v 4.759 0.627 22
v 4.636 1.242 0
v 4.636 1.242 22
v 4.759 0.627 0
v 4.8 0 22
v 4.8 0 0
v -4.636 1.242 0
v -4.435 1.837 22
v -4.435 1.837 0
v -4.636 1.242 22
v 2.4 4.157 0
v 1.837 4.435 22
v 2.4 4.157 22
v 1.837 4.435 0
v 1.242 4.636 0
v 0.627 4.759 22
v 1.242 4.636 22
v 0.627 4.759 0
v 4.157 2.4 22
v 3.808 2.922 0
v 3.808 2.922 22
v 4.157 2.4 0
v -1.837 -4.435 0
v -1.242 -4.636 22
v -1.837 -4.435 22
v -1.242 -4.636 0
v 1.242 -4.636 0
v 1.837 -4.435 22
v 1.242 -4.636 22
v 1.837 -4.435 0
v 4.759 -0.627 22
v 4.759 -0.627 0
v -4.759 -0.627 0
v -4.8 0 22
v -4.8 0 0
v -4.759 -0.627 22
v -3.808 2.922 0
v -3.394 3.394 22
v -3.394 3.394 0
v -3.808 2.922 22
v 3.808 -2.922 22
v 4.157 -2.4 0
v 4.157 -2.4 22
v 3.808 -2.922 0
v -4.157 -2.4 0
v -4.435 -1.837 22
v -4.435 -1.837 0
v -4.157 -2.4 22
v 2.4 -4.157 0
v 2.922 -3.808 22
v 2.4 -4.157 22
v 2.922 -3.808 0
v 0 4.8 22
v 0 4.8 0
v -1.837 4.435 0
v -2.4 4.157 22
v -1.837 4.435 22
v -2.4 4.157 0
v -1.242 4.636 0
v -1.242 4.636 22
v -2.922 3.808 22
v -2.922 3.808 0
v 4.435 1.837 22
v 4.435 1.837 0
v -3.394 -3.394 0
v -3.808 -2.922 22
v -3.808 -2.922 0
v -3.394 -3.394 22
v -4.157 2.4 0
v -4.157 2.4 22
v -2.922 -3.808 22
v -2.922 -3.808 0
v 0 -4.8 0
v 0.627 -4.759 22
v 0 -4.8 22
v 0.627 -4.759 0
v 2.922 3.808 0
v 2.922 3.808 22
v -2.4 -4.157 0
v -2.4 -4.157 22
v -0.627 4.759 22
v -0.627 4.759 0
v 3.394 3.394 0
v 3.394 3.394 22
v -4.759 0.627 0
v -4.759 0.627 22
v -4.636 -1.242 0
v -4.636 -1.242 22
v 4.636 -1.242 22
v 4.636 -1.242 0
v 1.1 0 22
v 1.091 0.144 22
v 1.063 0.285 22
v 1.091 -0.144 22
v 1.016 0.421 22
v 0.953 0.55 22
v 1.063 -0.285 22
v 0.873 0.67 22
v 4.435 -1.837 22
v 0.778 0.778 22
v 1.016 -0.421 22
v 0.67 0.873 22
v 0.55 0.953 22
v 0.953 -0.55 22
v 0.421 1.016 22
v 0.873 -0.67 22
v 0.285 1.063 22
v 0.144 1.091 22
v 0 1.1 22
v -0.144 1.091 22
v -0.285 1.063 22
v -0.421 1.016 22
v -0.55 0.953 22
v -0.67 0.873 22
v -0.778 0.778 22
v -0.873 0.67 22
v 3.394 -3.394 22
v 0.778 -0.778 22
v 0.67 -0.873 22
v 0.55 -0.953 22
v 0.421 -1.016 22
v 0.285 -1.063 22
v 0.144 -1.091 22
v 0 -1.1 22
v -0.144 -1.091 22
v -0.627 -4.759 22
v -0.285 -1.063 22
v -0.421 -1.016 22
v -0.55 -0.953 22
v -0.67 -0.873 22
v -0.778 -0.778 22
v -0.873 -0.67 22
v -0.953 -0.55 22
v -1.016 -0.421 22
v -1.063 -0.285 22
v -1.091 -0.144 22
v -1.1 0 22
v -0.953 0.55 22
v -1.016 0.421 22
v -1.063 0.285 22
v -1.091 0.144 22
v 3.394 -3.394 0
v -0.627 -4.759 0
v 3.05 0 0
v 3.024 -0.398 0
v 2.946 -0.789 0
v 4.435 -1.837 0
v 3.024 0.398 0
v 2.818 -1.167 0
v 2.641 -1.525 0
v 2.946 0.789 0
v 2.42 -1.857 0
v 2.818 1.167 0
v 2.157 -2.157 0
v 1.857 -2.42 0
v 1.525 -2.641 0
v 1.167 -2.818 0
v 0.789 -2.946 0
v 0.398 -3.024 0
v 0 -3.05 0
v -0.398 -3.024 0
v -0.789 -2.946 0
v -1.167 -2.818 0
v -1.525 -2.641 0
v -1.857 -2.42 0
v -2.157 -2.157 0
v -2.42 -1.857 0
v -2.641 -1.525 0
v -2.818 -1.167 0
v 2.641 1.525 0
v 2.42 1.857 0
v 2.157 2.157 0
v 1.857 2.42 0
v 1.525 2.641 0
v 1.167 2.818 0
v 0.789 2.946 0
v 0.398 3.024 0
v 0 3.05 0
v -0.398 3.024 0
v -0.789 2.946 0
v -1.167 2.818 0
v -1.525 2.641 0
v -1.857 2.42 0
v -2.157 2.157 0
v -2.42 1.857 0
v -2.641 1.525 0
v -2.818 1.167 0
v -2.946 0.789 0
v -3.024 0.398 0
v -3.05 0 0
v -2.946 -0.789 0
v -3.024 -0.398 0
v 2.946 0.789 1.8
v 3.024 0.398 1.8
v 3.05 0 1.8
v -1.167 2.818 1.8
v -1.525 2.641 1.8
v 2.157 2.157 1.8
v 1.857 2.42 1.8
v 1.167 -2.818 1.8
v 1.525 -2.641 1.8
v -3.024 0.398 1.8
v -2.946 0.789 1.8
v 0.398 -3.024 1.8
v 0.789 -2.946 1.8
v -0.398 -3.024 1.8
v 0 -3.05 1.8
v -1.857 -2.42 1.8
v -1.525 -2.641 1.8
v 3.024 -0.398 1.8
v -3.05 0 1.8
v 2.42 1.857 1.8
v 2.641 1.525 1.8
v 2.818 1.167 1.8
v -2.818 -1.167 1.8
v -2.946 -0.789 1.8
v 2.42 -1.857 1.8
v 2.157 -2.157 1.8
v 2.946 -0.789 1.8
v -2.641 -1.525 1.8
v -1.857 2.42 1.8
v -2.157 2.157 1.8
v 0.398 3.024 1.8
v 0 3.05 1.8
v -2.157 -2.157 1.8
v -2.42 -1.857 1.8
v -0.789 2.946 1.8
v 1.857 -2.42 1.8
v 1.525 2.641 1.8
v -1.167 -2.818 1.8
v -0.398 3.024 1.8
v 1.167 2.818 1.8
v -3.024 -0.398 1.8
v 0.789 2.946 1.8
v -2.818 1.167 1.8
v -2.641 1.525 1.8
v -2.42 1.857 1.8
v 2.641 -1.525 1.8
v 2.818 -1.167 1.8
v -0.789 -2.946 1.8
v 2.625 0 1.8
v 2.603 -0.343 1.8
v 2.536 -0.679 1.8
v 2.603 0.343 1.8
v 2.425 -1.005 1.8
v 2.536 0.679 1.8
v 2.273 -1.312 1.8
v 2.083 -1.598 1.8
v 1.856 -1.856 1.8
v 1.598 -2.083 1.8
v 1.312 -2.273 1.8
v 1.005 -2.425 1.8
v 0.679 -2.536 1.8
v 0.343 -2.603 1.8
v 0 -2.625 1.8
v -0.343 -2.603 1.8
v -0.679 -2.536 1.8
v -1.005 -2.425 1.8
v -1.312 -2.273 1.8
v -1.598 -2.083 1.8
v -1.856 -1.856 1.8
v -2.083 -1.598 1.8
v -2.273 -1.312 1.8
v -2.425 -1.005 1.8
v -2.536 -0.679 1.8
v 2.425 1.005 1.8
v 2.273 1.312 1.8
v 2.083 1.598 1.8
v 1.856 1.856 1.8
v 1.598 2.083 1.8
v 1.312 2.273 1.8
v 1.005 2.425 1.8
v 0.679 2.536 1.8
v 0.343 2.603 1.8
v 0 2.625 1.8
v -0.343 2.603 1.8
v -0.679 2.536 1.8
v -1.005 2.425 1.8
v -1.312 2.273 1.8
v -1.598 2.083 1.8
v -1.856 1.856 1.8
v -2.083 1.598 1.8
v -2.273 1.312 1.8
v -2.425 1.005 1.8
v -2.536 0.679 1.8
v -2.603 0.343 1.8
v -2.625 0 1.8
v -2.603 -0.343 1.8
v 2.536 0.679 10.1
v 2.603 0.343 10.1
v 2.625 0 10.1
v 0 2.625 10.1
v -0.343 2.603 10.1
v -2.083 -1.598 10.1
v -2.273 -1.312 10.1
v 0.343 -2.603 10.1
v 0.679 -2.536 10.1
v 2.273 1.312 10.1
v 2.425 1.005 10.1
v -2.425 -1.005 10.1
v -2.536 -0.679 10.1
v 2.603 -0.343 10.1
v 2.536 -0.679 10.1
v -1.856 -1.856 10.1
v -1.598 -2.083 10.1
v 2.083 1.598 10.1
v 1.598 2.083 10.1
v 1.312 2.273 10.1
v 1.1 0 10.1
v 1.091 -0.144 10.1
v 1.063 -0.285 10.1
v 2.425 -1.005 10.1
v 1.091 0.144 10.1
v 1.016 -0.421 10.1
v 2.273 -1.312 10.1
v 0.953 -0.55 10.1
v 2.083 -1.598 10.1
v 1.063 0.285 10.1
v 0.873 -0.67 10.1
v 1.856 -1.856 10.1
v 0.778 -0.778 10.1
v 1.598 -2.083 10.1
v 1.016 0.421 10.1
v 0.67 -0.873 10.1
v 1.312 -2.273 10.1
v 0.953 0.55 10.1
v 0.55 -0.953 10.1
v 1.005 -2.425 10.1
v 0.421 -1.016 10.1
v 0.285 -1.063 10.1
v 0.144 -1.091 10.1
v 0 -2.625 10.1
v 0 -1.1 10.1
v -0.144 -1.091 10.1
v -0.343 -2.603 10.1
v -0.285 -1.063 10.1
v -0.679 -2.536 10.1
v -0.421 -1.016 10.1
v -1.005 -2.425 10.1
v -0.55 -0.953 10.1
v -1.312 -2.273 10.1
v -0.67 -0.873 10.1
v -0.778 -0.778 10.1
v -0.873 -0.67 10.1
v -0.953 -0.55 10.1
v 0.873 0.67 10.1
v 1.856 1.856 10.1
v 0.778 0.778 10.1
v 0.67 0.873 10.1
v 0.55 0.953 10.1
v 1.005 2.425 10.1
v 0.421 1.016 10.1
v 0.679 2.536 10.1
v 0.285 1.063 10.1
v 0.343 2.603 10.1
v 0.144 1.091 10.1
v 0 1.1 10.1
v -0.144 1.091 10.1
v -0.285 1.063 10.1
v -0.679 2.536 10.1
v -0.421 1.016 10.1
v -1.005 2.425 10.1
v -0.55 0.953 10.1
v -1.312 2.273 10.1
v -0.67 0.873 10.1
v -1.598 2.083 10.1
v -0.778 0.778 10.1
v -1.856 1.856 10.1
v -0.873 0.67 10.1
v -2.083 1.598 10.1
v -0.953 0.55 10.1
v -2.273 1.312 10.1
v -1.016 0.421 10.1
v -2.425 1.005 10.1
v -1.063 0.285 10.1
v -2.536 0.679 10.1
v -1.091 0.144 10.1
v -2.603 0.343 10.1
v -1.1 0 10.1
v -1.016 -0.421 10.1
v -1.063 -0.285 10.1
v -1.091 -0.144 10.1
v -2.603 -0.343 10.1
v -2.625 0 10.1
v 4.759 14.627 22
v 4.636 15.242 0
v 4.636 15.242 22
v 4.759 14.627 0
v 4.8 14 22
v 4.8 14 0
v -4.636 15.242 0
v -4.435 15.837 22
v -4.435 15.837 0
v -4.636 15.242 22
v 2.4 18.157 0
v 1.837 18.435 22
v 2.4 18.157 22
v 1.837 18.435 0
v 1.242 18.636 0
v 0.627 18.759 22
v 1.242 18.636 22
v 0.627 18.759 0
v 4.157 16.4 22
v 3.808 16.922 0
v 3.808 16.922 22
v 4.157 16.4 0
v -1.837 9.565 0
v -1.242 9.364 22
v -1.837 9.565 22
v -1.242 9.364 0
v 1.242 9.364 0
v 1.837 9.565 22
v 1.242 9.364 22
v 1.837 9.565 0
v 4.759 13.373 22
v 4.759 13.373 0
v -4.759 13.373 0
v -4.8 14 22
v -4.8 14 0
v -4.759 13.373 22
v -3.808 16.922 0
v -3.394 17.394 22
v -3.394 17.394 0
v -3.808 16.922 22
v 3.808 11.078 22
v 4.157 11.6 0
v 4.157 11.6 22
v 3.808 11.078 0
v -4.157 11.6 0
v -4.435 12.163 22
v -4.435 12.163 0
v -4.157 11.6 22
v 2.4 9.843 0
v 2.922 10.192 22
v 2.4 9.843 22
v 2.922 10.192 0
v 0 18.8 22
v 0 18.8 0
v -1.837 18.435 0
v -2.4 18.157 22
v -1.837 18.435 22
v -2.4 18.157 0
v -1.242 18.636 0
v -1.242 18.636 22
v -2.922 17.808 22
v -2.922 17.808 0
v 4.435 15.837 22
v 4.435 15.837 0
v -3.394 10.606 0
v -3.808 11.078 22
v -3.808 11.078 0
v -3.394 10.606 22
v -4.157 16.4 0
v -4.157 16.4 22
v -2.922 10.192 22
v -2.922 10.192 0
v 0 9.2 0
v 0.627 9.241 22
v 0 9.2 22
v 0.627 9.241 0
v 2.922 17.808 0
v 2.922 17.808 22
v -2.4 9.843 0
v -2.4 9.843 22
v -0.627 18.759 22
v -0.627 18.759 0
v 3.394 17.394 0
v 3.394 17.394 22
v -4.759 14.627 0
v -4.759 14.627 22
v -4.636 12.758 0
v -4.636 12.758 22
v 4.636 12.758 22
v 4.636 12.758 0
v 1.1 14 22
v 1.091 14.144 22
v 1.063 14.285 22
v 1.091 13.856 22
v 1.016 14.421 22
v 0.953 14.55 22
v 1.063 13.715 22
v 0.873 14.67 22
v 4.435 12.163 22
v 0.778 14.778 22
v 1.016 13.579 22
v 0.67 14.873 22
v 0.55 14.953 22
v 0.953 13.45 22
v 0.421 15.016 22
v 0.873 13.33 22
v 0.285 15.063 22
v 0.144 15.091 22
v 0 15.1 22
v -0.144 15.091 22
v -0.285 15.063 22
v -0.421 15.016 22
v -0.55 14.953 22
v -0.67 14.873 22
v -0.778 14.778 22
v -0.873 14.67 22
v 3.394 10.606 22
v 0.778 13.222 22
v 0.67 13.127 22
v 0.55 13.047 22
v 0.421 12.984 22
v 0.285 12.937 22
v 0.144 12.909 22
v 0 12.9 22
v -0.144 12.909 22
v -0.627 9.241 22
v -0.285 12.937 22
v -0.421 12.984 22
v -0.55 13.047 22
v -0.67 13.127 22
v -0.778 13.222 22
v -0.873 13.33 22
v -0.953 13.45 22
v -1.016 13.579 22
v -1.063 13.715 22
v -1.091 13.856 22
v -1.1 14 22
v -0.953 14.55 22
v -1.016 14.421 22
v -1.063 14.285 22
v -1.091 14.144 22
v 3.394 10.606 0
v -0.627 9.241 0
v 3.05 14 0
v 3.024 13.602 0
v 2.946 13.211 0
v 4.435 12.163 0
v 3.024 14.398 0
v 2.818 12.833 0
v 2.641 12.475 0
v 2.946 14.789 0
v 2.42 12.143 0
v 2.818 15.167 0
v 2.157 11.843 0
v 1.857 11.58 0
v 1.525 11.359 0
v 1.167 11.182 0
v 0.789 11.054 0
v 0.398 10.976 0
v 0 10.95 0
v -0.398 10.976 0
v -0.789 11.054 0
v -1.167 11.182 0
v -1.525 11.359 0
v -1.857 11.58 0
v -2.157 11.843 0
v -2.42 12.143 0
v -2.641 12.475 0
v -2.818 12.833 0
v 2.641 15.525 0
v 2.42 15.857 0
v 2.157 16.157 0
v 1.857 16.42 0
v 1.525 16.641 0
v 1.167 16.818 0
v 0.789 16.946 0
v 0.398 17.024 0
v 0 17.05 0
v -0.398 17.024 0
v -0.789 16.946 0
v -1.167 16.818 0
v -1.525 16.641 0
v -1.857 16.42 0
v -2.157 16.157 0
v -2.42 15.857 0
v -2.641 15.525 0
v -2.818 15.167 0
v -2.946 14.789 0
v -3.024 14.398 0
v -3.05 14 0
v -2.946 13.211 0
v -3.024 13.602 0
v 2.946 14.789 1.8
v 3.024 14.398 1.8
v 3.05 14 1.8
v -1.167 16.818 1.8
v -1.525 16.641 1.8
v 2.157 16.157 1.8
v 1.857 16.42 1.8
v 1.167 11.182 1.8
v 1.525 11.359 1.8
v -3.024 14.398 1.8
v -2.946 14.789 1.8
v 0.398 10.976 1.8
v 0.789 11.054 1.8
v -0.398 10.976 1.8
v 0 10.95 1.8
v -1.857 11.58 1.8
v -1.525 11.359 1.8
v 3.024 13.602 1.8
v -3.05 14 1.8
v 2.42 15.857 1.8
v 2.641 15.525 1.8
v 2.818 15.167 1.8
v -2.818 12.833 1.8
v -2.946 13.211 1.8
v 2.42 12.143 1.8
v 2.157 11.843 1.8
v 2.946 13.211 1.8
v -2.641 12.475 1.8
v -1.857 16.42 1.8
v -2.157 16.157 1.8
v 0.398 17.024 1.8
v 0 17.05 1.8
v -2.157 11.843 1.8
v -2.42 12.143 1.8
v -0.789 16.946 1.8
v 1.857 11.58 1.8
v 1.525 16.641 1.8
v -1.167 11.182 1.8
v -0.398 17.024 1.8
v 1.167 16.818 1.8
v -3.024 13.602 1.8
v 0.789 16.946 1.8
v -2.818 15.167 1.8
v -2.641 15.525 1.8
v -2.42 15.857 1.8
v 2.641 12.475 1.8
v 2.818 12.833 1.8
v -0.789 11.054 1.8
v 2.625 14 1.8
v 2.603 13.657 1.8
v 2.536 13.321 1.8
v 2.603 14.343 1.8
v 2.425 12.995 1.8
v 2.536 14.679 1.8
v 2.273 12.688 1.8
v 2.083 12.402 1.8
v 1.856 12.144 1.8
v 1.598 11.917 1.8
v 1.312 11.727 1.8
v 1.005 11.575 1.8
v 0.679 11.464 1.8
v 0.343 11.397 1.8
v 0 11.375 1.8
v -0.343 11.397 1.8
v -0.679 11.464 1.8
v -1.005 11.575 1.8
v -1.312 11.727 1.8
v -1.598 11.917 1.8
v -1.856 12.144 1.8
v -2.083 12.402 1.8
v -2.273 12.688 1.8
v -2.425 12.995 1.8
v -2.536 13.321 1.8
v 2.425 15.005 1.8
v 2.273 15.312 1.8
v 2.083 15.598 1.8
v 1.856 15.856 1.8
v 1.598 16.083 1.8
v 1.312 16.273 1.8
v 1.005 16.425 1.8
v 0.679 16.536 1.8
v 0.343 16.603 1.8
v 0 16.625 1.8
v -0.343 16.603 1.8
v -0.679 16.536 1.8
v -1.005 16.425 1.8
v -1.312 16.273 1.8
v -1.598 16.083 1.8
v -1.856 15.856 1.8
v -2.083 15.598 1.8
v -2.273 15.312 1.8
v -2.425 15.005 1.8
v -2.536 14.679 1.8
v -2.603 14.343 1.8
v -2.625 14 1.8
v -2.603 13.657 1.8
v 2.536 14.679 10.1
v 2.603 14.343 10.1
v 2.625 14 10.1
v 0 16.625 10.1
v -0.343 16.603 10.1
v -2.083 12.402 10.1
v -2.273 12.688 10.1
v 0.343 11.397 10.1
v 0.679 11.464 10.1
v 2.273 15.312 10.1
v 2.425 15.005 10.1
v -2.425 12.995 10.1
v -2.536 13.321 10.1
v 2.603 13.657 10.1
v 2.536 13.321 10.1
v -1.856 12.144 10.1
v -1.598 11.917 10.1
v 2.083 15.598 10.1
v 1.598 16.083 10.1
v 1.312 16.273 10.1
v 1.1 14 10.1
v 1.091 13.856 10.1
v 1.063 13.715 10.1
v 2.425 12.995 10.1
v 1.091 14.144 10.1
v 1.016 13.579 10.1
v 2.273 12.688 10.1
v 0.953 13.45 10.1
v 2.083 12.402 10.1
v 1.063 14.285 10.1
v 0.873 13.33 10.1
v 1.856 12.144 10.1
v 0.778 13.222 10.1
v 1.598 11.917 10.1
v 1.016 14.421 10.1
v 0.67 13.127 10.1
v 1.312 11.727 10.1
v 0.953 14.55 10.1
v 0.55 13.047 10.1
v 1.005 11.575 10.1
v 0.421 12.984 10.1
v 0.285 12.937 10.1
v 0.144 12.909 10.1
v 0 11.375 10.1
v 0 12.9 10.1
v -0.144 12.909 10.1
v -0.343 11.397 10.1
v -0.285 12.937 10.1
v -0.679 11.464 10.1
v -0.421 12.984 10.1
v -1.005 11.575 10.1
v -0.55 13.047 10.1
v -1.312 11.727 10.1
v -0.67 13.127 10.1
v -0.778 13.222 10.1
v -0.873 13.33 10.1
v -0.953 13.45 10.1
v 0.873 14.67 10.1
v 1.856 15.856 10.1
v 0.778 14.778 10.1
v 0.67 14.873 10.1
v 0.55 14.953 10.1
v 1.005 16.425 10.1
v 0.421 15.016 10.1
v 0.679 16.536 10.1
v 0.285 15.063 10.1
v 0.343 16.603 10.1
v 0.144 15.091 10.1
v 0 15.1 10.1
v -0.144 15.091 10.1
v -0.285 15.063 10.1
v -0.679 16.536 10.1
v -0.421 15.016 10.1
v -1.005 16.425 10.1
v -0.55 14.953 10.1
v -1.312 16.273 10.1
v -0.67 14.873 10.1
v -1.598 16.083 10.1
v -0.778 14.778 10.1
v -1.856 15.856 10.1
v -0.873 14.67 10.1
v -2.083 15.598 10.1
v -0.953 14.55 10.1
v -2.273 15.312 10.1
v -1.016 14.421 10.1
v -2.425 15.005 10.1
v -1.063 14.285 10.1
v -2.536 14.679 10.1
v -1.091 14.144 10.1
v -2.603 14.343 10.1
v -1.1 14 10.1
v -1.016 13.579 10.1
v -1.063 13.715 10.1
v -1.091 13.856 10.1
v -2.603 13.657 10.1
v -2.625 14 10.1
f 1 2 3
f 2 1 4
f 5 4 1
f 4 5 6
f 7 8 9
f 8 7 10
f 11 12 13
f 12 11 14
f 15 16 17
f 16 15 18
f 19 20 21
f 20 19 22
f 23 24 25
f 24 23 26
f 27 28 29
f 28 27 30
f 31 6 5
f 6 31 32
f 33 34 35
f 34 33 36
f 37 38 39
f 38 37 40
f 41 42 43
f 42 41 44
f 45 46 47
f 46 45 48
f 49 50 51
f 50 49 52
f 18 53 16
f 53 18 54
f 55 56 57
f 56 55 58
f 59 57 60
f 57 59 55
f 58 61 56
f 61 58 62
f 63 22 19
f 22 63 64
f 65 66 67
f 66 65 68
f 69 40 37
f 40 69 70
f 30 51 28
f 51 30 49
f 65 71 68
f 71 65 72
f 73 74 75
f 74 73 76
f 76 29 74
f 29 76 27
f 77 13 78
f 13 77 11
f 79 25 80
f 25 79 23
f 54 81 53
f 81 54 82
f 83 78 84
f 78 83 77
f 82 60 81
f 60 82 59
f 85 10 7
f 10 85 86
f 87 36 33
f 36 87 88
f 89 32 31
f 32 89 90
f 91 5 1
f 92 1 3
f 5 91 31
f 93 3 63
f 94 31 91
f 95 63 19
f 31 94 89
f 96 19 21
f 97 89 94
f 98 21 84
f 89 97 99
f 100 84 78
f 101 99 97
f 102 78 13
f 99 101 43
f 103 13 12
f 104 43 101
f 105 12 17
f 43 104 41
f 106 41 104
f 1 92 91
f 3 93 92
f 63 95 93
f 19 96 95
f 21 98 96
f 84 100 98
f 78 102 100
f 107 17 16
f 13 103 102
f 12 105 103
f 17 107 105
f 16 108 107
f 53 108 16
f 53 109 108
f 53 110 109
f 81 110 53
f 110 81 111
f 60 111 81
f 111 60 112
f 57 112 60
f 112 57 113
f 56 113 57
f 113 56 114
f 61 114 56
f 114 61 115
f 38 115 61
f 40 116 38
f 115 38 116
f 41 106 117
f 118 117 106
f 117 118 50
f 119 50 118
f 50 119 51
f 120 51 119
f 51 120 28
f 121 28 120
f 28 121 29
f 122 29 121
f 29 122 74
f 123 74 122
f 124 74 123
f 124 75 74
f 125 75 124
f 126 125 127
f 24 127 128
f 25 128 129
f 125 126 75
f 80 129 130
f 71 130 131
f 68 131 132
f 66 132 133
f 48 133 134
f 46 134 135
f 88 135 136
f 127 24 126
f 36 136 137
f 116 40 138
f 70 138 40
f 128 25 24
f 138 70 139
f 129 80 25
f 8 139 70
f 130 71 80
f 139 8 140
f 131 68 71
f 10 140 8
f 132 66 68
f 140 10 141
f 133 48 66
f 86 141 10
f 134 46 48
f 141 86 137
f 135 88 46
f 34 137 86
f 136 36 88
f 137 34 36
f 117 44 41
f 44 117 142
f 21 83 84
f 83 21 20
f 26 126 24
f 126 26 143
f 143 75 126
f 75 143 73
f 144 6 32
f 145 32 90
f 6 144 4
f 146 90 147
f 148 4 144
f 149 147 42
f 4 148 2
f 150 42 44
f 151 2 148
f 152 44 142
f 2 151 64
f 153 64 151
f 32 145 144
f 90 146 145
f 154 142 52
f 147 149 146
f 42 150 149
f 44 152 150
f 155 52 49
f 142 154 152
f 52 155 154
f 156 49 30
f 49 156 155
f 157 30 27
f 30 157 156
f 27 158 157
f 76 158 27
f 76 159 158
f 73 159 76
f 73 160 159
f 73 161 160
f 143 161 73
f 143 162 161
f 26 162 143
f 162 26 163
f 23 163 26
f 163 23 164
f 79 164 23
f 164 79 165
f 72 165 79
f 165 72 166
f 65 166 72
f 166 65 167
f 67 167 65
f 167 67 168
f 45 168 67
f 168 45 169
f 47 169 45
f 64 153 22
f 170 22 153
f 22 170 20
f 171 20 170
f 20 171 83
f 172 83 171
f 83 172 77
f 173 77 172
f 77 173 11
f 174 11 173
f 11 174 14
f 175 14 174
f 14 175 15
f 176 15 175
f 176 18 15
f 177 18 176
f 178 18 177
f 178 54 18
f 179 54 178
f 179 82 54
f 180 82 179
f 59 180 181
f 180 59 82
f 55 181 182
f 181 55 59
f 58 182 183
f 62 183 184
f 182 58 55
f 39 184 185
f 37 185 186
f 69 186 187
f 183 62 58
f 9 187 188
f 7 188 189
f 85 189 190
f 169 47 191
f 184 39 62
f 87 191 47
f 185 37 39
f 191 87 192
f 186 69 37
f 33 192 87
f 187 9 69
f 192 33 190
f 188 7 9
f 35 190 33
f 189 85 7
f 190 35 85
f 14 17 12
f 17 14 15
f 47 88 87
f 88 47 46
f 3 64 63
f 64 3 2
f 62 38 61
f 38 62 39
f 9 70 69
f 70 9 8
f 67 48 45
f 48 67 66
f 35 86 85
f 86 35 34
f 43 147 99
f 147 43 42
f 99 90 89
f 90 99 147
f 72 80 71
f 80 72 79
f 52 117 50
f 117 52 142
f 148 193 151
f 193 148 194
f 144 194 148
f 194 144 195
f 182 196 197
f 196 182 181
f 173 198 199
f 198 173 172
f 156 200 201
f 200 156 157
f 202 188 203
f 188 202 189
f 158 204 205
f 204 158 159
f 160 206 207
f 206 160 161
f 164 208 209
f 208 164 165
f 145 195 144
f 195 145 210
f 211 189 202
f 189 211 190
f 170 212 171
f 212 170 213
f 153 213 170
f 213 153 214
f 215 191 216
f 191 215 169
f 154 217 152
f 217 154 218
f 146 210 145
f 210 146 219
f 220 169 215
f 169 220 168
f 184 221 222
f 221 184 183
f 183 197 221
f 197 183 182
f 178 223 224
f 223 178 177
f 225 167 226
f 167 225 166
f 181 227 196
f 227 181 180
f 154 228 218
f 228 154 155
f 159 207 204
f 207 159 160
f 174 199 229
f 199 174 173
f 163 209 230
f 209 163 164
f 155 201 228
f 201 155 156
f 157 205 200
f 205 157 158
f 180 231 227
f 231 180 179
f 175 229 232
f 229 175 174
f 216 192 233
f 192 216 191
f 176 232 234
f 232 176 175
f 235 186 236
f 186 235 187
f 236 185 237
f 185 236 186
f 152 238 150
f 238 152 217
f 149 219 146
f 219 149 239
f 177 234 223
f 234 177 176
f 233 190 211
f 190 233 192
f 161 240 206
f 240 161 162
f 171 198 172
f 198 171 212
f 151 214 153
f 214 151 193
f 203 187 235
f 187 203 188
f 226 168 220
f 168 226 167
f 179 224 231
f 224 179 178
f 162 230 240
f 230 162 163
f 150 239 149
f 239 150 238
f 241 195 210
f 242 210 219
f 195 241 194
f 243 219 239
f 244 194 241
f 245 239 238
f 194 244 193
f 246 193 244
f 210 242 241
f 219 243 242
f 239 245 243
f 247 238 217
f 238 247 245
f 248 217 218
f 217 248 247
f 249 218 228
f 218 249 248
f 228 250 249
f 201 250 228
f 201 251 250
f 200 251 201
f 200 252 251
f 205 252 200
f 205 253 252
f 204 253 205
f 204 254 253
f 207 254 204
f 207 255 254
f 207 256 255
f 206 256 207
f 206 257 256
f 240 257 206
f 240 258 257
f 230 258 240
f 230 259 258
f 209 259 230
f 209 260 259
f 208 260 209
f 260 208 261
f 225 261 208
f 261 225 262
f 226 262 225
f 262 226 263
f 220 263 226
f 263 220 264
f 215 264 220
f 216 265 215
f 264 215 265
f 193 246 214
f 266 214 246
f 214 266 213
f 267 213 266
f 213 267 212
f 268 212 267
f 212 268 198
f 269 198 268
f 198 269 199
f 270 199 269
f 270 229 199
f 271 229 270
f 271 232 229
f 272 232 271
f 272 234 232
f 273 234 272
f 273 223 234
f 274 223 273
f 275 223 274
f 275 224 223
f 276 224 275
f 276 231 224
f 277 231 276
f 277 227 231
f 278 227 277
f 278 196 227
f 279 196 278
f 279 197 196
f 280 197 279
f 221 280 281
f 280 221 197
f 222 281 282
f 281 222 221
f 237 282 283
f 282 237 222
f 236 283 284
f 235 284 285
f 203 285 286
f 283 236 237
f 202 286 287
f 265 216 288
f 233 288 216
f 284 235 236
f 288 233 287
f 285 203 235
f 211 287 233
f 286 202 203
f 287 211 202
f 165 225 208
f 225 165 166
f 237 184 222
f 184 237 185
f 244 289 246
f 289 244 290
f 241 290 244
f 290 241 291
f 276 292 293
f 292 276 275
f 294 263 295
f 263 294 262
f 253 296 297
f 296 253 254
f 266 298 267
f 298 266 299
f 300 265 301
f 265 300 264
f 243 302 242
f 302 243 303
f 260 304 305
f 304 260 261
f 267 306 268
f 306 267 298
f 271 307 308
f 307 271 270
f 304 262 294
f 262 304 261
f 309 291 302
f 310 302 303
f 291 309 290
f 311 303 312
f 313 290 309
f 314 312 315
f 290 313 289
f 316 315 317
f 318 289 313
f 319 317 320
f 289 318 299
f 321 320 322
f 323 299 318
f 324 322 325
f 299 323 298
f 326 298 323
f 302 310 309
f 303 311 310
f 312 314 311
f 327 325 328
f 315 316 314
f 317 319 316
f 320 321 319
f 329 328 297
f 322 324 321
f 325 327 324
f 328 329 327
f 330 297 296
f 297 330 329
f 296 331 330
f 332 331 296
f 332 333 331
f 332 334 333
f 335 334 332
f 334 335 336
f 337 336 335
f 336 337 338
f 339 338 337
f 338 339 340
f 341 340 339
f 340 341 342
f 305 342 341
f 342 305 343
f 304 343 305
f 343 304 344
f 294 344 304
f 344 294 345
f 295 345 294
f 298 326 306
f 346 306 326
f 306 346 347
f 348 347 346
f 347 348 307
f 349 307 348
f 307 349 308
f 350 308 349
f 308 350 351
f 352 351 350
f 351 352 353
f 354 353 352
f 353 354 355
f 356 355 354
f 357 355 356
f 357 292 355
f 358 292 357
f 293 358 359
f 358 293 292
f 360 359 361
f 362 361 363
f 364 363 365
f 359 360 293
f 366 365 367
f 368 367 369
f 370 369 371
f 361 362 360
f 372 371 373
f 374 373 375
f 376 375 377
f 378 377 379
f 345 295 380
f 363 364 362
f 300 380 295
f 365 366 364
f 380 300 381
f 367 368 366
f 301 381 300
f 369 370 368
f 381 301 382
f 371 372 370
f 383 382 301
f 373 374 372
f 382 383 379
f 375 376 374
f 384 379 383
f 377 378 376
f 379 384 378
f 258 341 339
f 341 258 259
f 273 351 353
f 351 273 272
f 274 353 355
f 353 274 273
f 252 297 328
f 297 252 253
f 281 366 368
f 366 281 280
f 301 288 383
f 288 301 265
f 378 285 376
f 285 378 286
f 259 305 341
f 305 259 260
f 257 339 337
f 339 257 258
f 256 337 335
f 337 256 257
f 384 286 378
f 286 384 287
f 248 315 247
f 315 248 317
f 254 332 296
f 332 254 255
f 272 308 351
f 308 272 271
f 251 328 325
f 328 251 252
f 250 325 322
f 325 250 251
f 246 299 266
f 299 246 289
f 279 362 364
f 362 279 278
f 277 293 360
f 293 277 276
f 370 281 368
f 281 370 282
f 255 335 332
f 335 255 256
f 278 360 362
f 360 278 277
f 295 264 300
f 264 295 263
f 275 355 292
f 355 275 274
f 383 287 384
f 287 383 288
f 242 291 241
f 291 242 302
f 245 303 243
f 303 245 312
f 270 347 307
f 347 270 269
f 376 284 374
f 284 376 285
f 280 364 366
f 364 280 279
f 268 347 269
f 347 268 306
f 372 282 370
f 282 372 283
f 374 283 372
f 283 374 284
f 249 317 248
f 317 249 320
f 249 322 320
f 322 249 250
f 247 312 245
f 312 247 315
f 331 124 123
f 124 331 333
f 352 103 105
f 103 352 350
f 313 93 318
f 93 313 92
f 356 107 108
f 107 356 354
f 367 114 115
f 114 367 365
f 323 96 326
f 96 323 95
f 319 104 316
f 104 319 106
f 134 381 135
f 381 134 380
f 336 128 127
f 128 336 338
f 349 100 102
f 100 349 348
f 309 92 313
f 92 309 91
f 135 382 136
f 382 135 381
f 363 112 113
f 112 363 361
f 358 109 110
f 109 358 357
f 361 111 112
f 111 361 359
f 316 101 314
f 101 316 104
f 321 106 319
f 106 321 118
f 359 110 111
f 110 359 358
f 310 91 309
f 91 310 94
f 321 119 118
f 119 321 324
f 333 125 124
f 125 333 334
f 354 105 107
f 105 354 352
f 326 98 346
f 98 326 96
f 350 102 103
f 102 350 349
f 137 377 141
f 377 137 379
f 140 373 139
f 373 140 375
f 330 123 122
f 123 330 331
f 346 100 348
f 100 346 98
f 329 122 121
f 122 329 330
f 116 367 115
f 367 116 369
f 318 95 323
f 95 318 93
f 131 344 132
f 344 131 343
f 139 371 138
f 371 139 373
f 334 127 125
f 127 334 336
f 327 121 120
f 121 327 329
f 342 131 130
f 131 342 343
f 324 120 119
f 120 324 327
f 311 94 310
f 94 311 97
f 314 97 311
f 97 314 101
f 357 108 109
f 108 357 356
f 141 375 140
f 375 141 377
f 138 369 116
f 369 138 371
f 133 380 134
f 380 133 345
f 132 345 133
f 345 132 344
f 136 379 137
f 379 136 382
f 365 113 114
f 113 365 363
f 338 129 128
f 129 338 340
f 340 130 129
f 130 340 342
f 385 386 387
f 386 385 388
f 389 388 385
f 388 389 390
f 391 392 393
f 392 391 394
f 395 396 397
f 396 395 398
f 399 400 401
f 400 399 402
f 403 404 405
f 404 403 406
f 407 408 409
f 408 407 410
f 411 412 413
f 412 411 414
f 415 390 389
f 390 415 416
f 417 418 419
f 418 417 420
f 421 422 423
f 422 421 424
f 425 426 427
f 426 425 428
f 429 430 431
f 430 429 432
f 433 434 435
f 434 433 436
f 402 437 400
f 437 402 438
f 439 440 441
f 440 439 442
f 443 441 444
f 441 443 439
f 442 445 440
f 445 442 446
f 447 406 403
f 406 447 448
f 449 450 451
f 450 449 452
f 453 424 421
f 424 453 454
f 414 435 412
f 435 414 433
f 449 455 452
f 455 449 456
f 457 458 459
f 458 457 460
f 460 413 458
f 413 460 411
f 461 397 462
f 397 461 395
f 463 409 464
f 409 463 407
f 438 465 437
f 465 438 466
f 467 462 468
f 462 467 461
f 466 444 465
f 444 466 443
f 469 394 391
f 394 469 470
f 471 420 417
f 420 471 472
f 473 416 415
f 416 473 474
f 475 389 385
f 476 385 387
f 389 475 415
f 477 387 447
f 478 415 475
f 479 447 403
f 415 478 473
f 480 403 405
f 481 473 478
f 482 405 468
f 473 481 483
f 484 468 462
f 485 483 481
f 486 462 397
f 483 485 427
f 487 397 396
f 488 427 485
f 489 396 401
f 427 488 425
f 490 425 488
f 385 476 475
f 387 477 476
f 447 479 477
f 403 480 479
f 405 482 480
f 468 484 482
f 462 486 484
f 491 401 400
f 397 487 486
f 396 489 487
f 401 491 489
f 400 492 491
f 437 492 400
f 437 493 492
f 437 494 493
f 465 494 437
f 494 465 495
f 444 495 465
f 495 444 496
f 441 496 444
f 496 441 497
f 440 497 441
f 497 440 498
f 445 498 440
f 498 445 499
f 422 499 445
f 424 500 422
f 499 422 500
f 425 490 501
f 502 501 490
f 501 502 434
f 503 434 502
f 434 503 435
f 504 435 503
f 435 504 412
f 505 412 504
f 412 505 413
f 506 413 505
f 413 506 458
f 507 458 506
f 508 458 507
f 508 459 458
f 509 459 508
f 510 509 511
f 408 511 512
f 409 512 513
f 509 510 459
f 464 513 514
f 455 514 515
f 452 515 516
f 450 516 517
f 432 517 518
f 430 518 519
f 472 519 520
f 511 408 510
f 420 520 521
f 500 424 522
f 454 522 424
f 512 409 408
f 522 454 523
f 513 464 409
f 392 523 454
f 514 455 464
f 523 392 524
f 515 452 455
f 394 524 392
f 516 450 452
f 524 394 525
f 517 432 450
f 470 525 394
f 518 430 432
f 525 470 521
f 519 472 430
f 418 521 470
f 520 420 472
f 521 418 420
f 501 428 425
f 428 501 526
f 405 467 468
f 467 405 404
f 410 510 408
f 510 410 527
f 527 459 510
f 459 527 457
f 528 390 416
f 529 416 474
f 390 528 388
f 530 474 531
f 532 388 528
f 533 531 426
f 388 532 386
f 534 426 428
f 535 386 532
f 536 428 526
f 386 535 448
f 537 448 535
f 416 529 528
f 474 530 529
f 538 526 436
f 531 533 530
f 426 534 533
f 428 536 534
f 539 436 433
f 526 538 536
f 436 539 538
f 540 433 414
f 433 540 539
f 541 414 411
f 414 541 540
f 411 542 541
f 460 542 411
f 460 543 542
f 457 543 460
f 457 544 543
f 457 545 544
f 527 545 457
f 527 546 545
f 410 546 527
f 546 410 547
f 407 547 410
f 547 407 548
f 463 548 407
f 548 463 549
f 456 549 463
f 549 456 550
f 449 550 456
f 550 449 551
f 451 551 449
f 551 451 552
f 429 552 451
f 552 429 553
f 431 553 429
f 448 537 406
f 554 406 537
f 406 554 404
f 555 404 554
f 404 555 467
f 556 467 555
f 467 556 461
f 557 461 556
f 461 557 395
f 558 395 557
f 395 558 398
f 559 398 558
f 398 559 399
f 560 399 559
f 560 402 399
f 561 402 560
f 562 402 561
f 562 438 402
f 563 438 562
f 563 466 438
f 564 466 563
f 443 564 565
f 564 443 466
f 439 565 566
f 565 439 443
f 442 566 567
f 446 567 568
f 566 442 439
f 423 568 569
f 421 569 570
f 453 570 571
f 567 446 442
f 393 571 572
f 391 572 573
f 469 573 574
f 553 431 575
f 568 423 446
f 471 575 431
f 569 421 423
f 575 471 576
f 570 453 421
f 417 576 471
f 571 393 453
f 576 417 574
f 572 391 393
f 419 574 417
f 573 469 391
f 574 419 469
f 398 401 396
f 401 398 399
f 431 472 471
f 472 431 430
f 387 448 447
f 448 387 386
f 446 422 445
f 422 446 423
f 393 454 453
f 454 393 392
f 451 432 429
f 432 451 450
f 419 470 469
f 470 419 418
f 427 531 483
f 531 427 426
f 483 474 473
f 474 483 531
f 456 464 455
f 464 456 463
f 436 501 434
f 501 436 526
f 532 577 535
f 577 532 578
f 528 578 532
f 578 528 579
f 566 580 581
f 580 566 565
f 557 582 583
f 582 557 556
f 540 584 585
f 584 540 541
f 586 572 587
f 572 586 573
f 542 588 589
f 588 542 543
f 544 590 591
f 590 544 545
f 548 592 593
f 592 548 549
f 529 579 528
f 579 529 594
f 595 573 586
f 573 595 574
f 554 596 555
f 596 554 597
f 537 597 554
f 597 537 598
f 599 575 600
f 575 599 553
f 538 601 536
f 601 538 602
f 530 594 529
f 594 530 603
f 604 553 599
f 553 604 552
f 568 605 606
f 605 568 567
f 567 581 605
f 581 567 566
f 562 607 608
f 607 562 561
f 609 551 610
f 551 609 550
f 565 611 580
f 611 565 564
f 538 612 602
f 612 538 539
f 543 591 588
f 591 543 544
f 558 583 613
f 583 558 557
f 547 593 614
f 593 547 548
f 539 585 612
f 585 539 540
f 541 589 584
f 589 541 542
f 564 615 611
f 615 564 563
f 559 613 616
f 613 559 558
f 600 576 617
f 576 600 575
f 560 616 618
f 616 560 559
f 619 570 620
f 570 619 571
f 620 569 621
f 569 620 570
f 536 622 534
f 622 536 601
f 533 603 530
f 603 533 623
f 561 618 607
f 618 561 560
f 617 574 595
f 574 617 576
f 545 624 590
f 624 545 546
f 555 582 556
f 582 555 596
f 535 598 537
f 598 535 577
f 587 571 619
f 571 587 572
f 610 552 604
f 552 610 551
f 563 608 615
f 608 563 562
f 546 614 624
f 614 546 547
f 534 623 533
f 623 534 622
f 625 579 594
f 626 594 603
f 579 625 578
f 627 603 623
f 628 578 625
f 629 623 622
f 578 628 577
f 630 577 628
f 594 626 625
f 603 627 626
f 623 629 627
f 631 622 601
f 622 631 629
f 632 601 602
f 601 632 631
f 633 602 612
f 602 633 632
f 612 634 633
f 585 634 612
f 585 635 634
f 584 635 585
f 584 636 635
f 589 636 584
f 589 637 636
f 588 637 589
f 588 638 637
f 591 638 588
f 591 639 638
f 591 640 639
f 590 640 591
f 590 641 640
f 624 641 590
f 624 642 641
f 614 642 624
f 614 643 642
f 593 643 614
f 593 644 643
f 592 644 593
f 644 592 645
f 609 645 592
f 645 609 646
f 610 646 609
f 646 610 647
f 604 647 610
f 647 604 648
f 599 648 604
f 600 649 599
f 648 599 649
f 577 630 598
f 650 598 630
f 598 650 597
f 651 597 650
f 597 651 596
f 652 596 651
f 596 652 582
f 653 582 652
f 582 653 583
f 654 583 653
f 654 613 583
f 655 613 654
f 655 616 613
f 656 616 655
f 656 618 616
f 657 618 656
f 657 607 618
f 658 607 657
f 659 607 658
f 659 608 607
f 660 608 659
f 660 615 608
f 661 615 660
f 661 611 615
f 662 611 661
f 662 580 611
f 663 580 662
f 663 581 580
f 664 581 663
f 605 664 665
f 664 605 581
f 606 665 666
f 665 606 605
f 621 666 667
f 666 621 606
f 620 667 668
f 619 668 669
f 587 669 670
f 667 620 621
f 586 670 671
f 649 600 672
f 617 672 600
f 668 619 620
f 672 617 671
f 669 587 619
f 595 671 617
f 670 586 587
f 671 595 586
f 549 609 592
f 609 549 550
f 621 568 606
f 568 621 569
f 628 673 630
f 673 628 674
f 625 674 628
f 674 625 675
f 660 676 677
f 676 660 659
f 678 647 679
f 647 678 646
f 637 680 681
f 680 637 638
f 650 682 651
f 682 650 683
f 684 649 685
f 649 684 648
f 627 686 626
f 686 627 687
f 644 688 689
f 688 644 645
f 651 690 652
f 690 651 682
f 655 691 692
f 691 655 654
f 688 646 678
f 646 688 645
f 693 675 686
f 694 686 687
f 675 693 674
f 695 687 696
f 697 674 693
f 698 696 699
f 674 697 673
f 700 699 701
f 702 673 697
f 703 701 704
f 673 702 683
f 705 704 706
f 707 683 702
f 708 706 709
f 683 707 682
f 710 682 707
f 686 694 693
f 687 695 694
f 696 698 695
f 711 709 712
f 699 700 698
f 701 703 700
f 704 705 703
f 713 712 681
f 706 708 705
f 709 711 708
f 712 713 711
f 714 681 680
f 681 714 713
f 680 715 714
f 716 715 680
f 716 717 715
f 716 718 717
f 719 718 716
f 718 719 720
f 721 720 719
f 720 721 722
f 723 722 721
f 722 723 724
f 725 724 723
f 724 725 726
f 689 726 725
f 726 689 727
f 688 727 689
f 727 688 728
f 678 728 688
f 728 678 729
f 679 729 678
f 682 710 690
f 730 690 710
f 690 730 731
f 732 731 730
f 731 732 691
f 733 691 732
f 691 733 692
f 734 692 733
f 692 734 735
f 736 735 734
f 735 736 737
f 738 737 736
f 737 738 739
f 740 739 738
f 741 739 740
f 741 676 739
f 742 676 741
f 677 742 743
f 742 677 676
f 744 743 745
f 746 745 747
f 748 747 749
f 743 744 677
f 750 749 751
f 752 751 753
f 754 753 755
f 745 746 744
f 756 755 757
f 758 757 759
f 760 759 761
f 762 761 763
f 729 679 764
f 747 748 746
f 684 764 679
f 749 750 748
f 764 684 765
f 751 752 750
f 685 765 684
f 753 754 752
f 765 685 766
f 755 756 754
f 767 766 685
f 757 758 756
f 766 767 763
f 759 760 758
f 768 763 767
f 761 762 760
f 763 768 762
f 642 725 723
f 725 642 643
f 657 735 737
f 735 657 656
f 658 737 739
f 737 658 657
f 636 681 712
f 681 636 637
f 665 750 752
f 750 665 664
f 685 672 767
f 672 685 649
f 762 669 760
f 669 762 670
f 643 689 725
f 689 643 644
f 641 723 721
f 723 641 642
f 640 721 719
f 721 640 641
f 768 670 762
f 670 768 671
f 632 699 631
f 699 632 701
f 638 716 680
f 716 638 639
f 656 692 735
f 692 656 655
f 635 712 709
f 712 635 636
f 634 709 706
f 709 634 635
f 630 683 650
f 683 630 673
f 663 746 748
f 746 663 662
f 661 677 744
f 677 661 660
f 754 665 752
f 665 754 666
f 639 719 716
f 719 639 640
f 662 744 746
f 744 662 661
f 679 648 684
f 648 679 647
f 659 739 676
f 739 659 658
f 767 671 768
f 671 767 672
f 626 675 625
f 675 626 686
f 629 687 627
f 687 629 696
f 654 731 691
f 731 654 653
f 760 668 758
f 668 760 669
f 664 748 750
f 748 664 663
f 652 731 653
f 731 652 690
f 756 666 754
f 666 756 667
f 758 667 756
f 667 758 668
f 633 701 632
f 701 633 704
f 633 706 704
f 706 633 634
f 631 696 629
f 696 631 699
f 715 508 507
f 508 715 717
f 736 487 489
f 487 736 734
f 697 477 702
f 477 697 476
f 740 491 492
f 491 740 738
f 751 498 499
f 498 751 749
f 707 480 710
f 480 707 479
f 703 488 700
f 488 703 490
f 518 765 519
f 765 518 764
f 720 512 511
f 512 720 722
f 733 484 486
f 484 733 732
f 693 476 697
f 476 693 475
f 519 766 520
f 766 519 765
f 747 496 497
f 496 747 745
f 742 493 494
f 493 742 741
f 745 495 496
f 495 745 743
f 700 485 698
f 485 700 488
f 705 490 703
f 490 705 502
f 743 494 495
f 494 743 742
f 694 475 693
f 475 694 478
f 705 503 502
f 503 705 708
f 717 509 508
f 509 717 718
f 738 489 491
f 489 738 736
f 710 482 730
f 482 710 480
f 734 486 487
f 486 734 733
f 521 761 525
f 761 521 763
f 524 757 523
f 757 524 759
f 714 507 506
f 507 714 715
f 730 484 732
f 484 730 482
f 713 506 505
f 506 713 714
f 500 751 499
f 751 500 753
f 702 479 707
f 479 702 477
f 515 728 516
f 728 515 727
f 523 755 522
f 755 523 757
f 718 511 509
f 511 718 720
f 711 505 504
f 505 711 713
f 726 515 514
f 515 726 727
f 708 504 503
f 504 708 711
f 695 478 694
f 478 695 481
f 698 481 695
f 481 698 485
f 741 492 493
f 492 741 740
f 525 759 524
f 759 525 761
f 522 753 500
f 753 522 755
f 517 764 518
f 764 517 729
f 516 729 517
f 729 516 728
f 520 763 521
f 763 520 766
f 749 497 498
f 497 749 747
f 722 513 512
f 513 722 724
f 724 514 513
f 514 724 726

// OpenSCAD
// ============================================================================
// PROYECTO: Sistema de Comunicación por Medios Ópticos (EL2113 - ITCR)
// SERVICIO: LAIMI 2 – Impresión 3D (Edificio F4, Aula F4-05, Sede Cartago)
// EQUIPO DESTINO: Impresora 3D Prusa MK4
// ARCHIVO STL OFICIAL LAIMI: 2022437519-02.stl (Carné: 2022437519 - Pieza 02)
//
// Descripción:
//   Genera el modelo 3D paramétrico del par de capuchones cilíndricos compactos
//   (Opción B: Montaje directo sobre protoboard). Permite clavar las patas del
//   LED rojo de 5 mm y de la LDR GL5528 directamente en las filas de la
//   protoboard (a-j, 0-60) y encajar este capuchón negro por encima para
//   sujetar la fibra óptica plástica (POF) de 2.2 mm y bloquear la luz ambiental.
//
// Parámetros de Solicitud en LAIMI F4-05:
//   - Carné: 2022437519
//   - Uso: Curso (EL2113 - Circuitos Eléctricos en Corriente Continua)
//   - Material: PLA (o PETG)
//   - Resolución eje Z: 0.2 mm
//   - Relleno (Infill): 20% a 30%
//   - Color: Preferible negro u oscuro opaco (o pintar con acrílico negro).
// ============================================================================

$fn = 48;

d_ext_cap    = 9.6;  // Diámetro exterior compacto (< 4 filas de protoboard)
d_comp_cap   = 5.25; // Cavidad inferior para domo de LED 5 mm o LDR GL5528
d_reb_cap    = 6.1;  // Alojamiento inferior para el reborde del LED
d_fibra_cap  = 2.2;  // Conducto superior para fibra óptica plástica (POF)
h_total_cap  = 22.0; // Altura total del capuchón directo
h_comp_cap   = 10.0; // Profundidad de encaje sobre el LED/LDR

module capuchon_directo_protoboard() {
    difference() {
        // Cuerpo cilíndrico exterior sin pestañas laterales
        cylinder(h = h_total_cap, d = d_ext_cap, center = false);

        // Reborde inferior del LED (1.8 mm)
        translate([0, 0, -0.1])
            cylinder(h = 1.9, d = d_reb_cap, center = false);

        // Cavidad para el cuerpo del LED / LDR
        translate([0, 0, 1.7])
            cylinder(h = h_comp_cap - 1.6, d = d_comp_cap, center = false);

        // Conducto coaxial superior para la fibra óptica (12 mm de guía)
        translate([0, 0, h_comp_cap])
            cylinder(h = (h_total_cap - h_comp_cap) + 0.2, d = d_fibra_cap, center = false);
    }
}

// Instanciar par de capuchones (TX para LED y RX para LDR)
capuchon_directo_protoboard();
translate([0, 14, 0])
    capuchon_directo_protoboard();
